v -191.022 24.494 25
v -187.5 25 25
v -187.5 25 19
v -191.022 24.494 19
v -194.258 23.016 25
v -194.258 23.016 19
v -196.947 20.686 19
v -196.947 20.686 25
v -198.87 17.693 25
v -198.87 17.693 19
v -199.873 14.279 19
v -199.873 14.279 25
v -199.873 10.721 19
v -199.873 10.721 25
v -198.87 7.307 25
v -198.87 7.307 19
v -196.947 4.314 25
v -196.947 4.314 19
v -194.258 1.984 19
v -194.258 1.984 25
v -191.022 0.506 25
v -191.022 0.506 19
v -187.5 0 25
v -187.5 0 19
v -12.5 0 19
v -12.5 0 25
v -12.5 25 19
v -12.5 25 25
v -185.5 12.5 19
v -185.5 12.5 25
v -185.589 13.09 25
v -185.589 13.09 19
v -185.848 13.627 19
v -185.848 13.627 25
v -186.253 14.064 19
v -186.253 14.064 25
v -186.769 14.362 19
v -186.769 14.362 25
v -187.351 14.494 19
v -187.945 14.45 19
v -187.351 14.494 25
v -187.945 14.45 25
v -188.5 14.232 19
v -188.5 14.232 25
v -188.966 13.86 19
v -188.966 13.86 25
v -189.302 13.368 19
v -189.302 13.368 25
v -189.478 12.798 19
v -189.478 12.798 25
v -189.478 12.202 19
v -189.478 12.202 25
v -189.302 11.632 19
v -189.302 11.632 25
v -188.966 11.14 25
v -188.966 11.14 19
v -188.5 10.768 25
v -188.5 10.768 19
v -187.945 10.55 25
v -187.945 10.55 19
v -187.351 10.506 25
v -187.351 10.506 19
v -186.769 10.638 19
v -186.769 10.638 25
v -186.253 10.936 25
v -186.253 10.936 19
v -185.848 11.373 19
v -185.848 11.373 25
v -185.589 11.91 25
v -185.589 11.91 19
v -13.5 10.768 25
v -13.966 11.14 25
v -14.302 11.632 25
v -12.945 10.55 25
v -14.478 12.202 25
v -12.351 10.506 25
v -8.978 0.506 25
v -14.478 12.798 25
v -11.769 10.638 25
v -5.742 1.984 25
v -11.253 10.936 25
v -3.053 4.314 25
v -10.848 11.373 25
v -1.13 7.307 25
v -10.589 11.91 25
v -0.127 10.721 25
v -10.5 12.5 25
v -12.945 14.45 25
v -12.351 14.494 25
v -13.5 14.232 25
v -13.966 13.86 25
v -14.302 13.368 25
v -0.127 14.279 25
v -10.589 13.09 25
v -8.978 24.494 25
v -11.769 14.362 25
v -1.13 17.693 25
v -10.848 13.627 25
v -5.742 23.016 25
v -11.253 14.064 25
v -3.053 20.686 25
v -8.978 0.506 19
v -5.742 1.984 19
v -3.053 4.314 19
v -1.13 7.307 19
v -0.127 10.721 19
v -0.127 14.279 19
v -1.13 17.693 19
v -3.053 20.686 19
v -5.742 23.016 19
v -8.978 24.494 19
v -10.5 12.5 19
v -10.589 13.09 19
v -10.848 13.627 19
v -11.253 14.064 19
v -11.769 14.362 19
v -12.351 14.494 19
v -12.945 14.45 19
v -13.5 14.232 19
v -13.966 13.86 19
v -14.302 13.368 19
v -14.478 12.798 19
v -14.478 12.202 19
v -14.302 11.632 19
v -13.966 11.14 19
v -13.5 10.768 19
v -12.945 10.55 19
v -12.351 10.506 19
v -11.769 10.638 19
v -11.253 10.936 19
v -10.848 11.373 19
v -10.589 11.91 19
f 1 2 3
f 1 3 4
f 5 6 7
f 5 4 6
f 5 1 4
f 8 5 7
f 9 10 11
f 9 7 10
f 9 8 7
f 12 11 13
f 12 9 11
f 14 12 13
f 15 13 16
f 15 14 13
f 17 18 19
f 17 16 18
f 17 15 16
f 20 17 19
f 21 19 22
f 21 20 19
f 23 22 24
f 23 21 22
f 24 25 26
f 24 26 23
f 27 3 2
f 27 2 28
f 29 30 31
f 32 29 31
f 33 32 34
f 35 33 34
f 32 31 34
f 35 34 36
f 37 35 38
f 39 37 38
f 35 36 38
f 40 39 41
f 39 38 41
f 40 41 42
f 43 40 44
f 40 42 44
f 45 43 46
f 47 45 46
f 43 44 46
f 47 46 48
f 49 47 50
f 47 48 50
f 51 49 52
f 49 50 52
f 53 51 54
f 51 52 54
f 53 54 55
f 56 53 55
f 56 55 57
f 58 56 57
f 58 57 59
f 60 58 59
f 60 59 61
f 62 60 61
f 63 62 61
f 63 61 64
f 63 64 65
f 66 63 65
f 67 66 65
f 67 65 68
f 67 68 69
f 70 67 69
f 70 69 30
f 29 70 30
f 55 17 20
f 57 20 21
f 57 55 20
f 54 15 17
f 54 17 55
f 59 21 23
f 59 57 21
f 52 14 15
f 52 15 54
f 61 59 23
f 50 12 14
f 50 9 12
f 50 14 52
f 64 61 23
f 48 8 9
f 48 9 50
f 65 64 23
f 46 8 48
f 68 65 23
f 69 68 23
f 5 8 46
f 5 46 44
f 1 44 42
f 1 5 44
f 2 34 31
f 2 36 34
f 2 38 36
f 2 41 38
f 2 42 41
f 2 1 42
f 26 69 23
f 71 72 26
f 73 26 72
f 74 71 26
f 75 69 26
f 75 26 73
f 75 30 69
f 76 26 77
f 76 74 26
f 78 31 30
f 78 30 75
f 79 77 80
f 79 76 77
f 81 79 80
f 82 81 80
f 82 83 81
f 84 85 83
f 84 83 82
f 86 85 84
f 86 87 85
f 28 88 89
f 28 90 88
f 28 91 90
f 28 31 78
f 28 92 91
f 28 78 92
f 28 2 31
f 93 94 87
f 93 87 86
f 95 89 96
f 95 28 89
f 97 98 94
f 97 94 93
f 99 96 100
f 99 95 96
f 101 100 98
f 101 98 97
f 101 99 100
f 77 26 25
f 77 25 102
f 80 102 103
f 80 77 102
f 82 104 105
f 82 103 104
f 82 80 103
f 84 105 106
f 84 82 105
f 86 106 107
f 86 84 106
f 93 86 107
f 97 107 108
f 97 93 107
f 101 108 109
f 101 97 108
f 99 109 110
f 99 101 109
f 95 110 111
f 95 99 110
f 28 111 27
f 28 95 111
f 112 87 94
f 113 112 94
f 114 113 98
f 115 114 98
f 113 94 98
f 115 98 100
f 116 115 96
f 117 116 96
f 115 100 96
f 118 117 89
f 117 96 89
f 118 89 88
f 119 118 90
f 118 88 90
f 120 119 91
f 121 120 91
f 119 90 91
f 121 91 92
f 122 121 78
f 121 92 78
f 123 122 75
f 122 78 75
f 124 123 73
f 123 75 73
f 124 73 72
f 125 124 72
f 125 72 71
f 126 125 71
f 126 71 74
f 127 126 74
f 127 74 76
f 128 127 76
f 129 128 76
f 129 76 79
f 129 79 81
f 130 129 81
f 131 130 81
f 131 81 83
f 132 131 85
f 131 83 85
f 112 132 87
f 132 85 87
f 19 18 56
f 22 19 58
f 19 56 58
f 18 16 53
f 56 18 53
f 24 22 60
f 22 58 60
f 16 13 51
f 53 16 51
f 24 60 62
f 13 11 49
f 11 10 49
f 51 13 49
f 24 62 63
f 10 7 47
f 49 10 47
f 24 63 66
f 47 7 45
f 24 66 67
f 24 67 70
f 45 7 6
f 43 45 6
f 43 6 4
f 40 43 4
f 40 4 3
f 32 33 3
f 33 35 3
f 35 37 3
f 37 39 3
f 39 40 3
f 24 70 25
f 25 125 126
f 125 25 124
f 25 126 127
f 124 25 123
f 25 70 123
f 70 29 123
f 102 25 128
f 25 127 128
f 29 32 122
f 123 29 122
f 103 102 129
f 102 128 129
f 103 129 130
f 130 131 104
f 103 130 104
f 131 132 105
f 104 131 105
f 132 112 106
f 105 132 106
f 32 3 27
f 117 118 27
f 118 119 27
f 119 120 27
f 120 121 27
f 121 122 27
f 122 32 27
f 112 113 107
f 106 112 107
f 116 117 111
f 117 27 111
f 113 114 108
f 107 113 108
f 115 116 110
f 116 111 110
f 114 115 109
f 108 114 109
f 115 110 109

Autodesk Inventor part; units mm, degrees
ref_plane "YZ Plane" through (0, 0, 0) normal (1, 0, 0) x (0, 1, 0)
ref_plane "XZ Plane" through (0, 0, 0) normal (0, 1, 0) x (-1, 0, 0)
ref_plane "XY Plane" through (0, 0, 0) normal (0, 0, 1) x (1, 0, 0)
sketch "Sketch1" plane through (0, 0, 0) normal (0, 0, 1) x (1, 0, 0)
  line L0 (0, 0) -> (-250, 0)
  line L1 (-250, 0) -> (-250, 25)
  line L2 (-250, 25) -> (0, 25)
  line L3 (0, 25) -> (0, 0)
  dimension "d0" = 250
  dimension "d1" = 25
extrude "Extrusion1" add sketch "Sketch1" along normal blind 25
sketch "Sketch3" plane through (0, 0, 25) normal (0, 0, 1) x (1, 0, 0)
  line L0 (0, 25) -> (-250, 25) projected
  line L1 (-250, 0) -> (0, 0) projected
  line L2 (-250, 25) -> (-200, 25)
  line L3 (-200, 25) -> (-200, 0)
  line L4 (-200, 0) -> (-250, 0)
  line L5 (-250, 0) -> (-250, 25)
  dimension "d13" = 50
extrude "Extrusion3" cut sketch "Sketch3" against normal blind 25
sketch "Sketch4" plane through (0, 0, 25) normal (0, 0, 1) x (1, 0, 0)
  circle A0 centre (-187.5, 12.5) radius 12.5
  line L0 (-200, 0) -> (0, 0) projected
  line L1 (-200, 25) -> (-200, 0) projected
  circle A1 centre (-187.5, 12.5) radius 2
  circle A2 centre (-12.5, 12.5) radius 12.5
  line L2 (0, 0) -> (0, 25) projected
  circle A3 centre (-12.5, 12.5) radius 2
  line L3 (0, 25) -> (-200, 25) projected
  point P0 (-12.5, 25)
  point P1 (0, 12.5)
  point P2 (-12.5, 0)
  point P3 (-187.5, 25)
  point P4 (-200, 12.5)
  point P5 (-187.5, 0)
  dimension "d16" = 25
  dimension "d17" = 12.5
  dimension "d18" = 12.5
  dimension "d19" = 4
  dimension "d20" = 25
  dimension "d21" = 12.5
  dimension "d22" = 12.5
  dimension "d23" = 4
extrude "Extrusion4" cut sketch "Sketch4" against normal blind 25 contours A0 L1 L3 | L0 L1 A0 | L3 L2 A2 | A2 L2 L0 | A1 | A3
sketch "Sketch5" plane through (-187.5, 25, 0) normal (0, 1, 0) x (1, 0, 0)
  line L0 (-12.5, 0) -> (-12.5, -25) projected
  line L1 (187.5, 0) -> (-12.5, 0)
  line L2 (-12.5, 0) -> (-12.5, -19)
  line L3 (-12.5, -19) -> (187.5, -19)
  line L4 (187.5, -19) -> (187.5, 0)
  dimension "d26" = 19
extrude "Extrusion5" cut sketch "Sketch5" against normal blind 100
properties part number "Horizontal"
